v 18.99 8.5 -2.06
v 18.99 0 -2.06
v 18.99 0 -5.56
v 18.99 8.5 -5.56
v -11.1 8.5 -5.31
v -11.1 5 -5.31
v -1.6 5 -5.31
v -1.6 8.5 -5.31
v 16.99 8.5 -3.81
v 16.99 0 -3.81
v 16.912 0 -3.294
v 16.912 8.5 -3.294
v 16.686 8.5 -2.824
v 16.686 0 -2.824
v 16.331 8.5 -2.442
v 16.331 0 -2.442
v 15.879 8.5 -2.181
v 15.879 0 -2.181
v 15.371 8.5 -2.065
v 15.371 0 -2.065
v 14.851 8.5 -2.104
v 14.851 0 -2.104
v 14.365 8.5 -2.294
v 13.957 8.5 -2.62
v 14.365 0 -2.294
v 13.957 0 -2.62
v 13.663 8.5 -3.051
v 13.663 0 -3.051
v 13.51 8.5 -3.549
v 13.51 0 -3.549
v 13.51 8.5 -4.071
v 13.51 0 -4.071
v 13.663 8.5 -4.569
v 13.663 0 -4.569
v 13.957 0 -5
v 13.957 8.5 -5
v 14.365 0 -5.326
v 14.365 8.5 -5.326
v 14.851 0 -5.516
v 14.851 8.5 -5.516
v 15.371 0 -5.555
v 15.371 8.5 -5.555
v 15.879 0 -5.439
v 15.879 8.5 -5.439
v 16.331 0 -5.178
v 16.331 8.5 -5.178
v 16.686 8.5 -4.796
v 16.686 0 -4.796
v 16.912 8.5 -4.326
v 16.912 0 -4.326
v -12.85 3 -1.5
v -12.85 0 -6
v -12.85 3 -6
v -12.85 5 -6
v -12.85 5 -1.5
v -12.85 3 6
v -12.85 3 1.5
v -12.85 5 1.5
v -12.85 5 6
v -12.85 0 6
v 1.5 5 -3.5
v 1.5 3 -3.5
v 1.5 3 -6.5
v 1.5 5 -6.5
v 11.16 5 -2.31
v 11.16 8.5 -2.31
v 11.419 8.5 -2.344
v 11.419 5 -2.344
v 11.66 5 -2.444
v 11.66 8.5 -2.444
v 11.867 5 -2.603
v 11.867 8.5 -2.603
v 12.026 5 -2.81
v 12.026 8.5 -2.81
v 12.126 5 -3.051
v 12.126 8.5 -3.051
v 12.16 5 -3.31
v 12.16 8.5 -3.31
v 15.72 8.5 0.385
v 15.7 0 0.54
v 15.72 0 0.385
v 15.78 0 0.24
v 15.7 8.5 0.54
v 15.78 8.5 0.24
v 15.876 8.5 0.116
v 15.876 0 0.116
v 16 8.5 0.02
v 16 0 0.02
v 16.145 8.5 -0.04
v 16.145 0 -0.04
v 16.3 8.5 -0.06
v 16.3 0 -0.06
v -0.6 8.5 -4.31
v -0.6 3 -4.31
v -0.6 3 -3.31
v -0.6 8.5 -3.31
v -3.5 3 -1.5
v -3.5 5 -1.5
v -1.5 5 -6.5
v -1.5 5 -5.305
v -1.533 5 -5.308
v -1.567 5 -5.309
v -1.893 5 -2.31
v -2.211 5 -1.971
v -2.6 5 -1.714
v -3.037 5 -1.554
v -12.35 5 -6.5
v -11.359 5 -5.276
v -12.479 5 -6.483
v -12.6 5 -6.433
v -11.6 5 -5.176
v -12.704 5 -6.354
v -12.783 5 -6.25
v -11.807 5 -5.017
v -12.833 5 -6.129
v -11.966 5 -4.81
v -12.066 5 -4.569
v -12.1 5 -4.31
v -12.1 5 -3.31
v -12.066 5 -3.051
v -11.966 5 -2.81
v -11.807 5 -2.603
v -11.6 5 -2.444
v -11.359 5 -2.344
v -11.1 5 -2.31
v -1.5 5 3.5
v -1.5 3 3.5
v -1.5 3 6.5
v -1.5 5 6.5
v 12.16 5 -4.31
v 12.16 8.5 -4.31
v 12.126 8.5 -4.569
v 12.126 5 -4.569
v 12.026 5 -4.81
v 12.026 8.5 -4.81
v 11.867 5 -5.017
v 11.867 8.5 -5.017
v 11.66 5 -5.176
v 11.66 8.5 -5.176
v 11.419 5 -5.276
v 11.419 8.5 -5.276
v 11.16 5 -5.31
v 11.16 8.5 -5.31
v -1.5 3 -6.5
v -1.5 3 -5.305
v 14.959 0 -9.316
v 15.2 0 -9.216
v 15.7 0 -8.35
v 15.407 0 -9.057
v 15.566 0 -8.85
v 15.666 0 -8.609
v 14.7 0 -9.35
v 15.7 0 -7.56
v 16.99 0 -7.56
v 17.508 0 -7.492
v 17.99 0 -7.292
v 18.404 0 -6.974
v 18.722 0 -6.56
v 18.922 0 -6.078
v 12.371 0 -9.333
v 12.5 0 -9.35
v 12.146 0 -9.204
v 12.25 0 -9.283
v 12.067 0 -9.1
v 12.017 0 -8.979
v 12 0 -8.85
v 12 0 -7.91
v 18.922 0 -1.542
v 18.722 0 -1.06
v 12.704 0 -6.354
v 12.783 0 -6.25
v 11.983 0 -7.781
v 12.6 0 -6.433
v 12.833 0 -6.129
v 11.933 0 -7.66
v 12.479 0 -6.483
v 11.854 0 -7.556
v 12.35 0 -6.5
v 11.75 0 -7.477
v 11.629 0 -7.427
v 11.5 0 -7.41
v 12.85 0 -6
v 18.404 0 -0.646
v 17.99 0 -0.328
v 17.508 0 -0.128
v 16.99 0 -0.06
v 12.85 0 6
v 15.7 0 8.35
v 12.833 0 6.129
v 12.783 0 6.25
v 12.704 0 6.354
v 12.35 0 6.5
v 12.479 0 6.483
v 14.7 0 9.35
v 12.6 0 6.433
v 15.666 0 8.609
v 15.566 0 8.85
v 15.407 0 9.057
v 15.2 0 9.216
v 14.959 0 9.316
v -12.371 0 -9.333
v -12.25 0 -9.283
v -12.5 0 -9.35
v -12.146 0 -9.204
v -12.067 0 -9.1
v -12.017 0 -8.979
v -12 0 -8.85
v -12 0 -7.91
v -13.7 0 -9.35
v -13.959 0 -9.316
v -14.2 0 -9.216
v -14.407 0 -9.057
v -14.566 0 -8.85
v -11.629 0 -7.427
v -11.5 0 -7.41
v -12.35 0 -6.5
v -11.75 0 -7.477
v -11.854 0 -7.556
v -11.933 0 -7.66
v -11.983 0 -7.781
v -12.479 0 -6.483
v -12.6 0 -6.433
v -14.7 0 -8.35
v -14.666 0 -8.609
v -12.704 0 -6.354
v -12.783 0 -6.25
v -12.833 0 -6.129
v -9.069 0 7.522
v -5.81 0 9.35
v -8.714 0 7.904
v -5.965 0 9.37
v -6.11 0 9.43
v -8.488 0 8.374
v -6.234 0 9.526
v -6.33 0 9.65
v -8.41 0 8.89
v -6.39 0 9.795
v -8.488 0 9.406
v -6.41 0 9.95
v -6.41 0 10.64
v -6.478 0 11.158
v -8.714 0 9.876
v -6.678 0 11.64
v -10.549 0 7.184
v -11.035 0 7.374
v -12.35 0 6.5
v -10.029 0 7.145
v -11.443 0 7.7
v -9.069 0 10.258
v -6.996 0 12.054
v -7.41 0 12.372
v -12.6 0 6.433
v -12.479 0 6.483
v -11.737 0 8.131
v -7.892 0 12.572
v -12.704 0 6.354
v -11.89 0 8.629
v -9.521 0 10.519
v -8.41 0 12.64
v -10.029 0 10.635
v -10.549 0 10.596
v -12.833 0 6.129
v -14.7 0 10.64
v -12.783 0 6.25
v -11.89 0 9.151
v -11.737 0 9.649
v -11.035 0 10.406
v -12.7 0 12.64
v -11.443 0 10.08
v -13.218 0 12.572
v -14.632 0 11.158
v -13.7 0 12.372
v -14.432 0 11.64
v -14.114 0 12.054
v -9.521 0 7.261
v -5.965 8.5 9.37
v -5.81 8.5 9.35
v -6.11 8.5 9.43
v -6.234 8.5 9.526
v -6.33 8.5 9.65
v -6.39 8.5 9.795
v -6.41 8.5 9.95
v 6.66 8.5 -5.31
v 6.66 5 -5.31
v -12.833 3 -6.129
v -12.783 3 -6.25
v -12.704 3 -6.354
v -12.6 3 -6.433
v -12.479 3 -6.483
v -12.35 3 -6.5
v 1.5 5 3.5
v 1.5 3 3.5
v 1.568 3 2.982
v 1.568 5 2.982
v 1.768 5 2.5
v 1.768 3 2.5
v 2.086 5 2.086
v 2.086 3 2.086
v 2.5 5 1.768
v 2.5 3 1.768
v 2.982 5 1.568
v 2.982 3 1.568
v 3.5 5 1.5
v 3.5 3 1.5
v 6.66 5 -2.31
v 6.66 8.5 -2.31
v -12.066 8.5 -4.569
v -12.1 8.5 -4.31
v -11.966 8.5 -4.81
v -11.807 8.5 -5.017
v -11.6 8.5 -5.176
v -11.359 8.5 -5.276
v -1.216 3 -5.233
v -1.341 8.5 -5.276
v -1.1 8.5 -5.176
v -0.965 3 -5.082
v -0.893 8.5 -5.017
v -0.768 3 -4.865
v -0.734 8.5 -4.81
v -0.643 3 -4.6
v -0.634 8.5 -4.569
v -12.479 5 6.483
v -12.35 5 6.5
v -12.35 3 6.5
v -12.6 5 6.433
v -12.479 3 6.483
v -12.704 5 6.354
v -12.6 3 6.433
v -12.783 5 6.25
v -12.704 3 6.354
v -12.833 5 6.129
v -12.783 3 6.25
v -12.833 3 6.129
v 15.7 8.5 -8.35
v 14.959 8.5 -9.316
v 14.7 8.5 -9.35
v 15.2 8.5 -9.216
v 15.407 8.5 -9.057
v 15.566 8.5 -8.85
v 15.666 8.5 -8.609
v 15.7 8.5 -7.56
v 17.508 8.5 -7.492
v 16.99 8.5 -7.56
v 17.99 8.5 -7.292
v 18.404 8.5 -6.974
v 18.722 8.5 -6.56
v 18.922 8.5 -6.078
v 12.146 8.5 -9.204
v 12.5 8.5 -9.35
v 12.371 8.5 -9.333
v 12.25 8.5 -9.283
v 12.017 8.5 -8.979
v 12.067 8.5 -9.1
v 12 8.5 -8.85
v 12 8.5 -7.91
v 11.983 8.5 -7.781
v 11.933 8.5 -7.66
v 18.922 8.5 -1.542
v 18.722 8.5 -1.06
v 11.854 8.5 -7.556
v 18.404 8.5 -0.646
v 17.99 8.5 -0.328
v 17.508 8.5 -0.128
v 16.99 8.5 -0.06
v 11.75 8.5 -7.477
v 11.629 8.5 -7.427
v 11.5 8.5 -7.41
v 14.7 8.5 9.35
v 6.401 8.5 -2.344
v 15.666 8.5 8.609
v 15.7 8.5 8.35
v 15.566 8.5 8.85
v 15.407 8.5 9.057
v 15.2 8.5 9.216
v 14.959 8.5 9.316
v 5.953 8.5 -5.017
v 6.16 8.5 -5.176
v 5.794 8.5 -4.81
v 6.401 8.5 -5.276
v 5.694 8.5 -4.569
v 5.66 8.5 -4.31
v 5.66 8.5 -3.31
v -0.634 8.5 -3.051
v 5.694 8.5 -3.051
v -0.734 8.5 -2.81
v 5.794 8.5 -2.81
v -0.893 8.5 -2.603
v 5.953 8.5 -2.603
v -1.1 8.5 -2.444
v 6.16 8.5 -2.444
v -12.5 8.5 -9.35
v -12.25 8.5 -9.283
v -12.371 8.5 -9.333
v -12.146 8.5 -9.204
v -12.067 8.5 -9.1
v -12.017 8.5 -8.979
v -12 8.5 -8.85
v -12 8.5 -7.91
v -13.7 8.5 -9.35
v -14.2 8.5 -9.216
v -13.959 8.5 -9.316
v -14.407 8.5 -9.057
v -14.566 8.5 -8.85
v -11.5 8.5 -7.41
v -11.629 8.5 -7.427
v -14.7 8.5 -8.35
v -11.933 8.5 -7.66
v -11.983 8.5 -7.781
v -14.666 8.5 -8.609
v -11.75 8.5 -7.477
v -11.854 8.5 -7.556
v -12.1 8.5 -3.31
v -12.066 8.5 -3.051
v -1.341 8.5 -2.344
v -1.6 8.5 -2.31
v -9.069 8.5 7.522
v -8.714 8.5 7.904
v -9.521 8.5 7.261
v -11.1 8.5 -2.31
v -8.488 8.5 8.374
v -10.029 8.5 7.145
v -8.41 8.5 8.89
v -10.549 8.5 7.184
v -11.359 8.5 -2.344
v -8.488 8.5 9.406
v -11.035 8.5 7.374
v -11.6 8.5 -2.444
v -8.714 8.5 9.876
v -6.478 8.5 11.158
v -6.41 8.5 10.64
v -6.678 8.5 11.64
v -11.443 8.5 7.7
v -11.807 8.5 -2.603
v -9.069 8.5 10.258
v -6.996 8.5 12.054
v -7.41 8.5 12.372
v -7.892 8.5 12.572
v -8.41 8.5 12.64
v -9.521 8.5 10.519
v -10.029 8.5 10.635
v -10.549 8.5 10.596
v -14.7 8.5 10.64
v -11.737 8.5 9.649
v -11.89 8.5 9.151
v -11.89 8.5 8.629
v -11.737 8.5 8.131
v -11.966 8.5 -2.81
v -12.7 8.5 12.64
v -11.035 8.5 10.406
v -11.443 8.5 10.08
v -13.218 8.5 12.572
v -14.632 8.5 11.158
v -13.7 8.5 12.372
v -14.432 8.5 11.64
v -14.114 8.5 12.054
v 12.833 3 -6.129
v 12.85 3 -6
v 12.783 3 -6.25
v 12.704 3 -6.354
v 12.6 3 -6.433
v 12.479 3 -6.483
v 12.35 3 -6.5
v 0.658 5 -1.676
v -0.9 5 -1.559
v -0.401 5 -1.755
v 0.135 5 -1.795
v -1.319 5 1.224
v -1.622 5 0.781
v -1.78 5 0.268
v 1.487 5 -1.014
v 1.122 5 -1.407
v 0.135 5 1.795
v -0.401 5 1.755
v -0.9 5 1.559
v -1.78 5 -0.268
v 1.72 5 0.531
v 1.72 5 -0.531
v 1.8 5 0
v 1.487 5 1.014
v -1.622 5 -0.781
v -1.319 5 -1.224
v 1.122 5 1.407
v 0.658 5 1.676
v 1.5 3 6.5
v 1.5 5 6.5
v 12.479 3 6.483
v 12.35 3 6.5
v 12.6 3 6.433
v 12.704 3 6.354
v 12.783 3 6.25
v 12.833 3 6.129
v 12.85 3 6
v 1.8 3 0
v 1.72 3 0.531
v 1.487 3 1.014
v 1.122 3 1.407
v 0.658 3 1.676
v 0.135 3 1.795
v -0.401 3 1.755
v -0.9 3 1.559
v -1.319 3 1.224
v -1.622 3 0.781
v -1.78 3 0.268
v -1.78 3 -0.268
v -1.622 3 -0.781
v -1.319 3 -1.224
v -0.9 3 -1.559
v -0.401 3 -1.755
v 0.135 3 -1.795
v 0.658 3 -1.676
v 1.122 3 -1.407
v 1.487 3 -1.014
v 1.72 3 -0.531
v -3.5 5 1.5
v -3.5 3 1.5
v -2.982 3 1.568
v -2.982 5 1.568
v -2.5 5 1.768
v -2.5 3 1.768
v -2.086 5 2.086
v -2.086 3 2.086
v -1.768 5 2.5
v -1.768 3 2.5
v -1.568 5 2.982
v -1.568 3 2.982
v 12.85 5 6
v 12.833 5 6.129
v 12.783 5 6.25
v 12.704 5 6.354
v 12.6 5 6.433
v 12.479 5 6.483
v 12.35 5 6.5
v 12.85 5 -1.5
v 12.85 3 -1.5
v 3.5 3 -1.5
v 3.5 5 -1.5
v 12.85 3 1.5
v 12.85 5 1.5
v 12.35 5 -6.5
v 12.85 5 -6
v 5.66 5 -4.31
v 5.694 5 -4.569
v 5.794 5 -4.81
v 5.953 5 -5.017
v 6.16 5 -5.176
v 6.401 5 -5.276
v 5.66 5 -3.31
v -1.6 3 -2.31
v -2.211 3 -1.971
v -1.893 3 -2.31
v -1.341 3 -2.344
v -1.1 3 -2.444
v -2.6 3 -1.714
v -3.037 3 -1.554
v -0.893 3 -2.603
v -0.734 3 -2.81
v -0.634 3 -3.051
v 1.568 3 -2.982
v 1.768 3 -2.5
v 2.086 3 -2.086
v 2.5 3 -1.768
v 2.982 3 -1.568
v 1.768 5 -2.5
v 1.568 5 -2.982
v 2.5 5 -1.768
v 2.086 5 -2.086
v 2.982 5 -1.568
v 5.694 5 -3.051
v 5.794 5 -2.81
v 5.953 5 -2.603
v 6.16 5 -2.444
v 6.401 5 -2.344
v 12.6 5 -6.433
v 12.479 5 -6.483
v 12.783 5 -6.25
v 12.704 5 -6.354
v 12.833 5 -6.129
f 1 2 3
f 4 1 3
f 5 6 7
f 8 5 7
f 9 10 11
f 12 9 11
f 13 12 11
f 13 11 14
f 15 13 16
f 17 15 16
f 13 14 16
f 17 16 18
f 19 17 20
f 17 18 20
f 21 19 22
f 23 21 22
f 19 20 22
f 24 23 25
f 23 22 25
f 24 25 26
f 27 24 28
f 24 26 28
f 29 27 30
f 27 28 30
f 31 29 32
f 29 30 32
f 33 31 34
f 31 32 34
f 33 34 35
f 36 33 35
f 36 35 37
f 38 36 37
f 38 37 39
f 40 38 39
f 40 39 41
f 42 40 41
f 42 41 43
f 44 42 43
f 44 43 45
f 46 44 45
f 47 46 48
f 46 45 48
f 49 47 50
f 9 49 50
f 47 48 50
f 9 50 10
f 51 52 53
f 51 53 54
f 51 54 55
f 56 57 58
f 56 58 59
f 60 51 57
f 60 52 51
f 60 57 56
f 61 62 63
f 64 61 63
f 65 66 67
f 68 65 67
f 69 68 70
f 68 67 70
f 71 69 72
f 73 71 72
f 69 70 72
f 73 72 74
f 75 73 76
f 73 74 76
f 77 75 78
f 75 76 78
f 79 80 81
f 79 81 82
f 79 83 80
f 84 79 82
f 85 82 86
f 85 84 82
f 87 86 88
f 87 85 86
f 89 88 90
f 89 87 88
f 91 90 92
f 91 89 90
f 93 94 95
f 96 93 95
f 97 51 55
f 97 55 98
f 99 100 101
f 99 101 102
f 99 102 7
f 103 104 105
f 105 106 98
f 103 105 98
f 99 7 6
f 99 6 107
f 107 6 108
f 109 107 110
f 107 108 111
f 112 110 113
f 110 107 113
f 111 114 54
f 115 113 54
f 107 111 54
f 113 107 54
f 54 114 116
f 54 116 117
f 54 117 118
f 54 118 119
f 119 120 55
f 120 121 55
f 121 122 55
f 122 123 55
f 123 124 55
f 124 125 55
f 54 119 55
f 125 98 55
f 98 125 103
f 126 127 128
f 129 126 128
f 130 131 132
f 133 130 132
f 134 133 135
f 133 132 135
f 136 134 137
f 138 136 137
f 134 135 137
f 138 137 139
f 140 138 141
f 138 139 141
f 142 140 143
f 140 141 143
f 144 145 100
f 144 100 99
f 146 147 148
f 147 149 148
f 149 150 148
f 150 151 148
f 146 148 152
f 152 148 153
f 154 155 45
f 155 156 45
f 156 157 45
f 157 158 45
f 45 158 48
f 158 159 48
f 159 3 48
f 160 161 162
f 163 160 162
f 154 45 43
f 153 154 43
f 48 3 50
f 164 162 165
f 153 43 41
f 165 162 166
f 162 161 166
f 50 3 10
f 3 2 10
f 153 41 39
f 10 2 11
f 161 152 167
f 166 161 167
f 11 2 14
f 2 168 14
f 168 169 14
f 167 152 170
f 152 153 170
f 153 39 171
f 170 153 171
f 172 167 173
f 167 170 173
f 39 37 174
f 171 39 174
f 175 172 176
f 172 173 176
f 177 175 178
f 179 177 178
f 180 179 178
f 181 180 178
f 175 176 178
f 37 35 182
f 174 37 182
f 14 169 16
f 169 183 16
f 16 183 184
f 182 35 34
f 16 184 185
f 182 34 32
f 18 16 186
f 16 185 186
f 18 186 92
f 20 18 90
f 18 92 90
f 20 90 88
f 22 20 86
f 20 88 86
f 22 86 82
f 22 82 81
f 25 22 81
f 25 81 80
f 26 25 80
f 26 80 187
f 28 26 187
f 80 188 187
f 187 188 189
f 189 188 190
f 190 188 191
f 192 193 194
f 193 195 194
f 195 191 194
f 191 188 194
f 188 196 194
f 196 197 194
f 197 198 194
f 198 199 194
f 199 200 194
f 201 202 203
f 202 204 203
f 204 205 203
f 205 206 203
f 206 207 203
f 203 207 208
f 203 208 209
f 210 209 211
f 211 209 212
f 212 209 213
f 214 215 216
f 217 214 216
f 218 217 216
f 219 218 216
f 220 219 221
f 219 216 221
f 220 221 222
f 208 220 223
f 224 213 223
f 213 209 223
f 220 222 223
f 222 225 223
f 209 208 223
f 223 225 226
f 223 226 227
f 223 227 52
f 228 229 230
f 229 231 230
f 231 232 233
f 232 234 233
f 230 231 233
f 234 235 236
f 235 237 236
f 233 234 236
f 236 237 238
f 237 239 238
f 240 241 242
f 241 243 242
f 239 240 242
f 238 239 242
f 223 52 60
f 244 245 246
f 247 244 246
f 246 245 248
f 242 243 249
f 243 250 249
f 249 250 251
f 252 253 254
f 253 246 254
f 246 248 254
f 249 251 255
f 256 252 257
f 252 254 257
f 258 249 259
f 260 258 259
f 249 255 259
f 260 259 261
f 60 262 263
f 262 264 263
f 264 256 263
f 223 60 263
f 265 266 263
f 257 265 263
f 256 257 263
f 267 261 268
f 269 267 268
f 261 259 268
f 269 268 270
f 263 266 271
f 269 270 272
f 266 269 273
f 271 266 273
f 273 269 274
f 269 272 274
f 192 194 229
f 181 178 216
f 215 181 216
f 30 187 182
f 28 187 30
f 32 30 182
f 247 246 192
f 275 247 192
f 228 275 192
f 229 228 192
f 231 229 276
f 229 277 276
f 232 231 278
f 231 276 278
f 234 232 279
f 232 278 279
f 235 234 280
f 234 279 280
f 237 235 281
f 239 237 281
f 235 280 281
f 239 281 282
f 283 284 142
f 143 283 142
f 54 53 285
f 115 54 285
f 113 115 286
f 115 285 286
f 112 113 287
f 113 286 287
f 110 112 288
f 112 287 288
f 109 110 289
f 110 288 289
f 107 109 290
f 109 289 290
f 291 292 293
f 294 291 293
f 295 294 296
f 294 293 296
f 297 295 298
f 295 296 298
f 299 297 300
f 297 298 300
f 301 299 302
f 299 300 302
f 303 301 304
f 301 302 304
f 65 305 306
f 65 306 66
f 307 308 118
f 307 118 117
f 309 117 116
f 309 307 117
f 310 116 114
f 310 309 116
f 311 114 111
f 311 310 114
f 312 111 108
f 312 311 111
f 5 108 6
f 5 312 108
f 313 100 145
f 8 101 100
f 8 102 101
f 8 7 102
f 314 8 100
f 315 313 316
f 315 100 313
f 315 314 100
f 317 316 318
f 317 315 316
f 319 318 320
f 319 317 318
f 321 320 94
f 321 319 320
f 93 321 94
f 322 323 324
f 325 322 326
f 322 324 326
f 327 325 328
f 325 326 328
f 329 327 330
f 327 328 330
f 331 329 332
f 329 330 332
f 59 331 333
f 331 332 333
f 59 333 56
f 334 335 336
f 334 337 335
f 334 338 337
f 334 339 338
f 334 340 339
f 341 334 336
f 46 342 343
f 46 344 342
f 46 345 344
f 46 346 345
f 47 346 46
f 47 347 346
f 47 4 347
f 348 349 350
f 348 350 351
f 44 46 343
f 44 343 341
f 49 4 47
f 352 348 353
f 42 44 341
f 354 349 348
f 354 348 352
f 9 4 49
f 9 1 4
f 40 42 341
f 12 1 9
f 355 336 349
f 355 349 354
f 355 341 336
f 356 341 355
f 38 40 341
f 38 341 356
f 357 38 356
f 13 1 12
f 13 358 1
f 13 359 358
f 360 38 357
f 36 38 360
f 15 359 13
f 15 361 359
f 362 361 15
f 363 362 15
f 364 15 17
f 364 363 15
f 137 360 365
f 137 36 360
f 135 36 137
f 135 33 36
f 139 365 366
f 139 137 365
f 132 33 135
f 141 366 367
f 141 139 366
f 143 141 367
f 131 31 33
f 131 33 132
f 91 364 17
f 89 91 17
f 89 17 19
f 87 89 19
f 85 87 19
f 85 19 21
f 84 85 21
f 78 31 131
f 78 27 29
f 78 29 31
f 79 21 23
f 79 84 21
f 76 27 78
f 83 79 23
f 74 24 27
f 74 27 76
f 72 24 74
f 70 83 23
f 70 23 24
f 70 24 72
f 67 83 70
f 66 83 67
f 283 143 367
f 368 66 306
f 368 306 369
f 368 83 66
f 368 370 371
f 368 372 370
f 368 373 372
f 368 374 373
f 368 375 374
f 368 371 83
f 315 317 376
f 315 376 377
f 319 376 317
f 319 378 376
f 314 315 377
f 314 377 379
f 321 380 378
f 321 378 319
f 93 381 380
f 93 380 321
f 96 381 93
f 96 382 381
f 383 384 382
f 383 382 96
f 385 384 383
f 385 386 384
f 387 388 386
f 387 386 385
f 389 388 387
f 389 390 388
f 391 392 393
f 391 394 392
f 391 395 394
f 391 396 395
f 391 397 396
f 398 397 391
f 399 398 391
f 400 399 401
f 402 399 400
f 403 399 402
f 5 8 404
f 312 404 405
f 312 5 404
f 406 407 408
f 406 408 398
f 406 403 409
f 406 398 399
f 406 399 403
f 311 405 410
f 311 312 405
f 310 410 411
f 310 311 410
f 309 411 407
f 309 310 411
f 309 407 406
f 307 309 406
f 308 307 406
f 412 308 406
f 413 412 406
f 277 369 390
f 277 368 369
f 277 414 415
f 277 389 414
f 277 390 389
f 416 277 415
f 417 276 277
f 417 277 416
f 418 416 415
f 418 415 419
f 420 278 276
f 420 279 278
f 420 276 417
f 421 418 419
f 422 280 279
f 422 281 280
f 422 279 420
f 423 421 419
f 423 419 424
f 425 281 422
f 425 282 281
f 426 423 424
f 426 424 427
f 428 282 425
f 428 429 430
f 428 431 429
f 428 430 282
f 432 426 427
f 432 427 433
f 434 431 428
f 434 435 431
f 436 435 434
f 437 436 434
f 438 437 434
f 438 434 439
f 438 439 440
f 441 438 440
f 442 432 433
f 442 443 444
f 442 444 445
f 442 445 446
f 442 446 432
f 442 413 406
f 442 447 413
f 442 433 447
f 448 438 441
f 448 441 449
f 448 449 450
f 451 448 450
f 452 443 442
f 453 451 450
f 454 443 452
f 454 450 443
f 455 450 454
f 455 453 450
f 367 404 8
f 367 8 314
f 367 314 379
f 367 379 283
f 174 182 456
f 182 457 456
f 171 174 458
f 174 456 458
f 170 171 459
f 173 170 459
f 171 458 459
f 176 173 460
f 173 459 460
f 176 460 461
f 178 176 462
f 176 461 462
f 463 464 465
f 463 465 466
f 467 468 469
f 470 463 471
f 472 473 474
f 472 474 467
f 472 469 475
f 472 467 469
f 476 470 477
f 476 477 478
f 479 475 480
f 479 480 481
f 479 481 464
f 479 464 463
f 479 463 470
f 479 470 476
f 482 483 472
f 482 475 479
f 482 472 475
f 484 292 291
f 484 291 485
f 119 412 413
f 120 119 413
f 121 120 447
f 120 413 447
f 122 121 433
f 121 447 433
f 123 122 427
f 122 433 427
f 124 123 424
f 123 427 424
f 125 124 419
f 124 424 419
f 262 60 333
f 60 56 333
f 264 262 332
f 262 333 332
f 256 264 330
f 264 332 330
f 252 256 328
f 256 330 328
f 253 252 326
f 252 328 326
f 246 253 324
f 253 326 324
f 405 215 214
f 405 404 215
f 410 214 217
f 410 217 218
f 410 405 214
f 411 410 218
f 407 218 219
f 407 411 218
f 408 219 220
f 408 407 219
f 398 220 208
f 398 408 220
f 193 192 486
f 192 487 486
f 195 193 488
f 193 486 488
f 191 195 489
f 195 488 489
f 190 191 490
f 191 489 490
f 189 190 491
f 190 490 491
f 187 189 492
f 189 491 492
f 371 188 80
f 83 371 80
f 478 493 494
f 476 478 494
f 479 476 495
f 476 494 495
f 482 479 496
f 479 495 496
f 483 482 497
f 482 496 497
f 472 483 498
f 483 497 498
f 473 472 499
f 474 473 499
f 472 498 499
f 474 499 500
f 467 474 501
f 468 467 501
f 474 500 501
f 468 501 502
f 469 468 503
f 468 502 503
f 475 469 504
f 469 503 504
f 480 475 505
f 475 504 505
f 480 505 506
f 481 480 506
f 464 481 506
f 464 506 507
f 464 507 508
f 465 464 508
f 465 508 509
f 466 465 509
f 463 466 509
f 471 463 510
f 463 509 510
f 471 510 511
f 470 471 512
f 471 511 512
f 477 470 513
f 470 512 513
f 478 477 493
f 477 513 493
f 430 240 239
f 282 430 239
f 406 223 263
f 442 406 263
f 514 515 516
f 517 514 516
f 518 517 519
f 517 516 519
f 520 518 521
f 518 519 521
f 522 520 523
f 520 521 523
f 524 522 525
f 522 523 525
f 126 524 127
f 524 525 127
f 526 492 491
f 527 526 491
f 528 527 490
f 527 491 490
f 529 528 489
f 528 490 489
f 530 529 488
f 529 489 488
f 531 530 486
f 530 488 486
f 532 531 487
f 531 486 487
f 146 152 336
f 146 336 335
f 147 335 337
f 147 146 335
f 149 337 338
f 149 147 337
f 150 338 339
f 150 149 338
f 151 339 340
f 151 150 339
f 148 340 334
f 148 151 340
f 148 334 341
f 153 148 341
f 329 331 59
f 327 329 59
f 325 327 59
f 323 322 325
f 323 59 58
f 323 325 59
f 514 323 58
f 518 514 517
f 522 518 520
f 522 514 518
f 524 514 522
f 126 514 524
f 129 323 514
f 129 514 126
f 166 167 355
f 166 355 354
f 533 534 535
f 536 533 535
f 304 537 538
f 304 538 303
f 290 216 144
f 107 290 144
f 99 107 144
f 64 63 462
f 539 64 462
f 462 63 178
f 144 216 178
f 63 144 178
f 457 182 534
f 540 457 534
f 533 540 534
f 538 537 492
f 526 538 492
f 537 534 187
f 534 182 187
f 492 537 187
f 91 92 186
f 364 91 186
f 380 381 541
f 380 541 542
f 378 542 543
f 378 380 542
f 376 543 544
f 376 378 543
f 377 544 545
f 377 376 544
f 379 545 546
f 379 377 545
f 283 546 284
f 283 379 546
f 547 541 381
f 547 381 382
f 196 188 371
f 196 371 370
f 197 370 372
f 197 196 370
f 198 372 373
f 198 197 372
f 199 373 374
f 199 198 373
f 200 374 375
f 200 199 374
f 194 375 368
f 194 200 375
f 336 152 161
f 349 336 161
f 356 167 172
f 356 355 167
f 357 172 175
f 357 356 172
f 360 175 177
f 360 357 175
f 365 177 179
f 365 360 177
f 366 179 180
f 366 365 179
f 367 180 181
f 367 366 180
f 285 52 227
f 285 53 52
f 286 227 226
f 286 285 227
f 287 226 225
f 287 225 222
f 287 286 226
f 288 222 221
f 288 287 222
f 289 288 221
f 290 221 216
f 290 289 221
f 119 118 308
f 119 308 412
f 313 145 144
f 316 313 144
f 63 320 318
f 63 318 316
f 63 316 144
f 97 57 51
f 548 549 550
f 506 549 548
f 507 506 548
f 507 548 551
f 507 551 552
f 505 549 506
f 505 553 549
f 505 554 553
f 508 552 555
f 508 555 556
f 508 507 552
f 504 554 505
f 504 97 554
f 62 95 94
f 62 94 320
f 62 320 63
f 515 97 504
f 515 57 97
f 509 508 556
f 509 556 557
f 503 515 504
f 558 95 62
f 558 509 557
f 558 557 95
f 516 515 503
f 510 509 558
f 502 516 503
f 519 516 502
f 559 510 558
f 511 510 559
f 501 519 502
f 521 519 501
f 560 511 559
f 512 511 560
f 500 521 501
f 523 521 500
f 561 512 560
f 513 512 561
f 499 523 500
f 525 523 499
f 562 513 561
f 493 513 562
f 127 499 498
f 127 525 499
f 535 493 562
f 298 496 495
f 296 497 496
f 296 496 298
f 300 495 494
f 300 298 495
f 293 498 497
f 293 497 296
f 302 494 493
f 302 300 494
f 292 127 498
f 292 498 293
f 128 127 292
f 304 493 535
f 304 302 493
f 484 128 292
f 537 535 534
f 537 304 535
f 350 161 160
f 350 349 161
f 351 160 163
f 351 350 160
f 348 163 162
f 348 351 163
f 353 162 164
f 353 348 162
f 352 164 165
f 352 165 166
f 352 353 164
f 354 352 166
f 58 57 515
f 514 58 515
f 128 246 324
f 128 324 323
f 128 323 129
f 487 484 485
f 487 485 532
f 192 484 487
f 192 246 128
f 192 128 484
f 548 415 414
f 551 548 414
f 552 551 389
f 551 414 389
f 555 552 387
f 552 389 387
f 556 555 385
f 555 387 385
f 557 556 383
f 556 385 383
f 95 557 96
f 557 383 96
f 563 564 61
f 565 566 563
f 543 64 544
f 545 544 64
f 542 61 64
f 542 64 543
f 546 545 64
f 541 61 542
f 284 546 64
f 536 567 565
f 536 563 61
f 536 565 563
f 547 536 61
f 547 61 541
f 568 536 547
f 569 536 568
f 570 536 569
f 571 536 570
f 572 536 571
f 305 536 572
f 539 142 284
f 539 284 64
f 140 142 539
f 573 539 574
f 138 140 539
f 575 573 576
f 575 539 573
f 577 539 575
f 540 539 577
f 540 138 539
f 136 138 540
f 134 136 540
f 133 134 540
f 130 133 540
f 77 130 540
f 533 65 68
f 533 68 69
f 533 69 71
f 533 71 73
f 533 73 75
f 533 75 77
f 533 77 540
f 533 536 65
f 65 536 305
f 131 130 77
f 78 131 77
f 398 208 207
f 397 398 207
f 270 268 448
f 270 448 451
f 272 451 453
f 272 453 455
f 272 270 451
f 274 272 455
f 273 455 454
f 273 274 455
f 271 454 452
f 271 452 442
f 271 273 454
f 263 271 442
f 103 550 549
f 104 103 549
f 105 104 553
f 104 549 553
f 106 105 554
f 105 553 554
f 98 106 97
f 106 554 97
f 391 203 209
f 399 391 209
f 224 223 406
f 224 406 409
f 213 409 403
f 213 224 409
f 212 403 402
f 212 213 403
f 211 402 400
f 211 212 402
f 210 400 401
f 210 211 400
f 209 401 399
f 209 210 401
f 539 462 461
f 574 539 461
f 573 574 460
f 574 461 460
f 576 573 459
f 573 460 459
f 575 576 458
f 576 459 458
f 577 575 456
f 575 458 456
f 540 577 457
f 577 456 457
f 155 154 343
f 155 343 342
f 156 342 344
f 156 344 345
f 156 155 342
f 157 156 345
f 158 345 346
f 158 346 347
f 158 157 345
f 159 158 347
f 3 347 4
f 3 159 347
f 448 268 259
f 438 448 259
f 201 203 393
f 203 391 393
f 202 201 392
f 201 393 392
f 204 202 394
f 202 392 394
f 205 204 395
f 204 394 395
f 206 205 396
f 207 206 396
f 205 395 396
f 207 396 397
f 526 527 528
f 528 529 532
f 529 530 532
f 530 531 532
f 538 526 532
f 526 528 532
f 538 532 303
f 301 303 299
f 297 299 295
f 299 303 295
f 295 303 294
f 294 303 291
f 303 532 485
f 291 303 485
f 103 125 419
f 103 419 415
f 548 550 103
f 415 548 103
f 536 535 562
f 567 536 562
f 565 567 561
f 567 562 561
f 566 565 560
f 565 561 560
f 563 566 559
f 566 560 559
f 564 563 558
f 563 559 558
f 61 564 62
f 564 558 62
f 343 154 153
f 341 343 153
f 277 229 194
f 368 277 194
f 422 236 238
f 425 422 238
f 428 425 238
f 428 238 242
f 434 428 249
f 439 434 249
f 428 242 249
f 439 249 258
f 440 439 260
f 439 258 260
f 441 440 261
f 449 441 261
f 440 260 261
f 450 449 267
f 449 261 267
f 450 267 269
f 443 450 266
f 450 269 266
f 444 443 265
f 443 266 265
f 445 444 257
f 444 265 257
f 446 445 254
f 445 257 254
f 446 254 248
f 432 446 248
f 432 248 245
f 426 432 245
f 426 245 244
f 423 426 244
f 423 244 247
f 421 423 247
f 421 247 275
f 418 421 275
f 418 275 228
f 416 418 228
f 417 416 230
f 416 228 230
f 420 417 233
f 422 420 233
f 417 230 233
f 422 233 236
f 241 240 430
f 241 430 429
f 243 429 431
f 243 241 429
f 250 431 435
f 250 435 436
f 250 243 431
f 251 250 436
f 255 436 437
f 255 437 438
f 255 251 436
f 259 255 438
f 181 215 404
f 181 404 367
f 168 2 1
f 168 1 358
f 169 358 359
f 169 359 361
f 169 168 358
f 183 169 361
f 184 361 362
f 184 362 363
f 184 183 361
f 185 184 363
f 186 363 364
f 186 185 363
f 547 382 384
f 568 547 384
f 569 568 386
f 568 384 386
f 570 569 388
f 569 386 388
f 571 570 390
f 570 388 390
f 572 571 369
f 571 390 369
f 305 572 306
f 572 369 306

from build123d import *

# Parameters (mm, degrees)
SKETCH004_R     = 1.75
SKETCH004_W     = 11.5
SKETCH004_H     = 3
SKETCH004_W_2   = 6.5
PAD_DEPTH       = 8.5
FILLET_R        = 1
FILLET001_R     = 0.6
FILLET002_R     = 0.5
SKETCH_W        = 25.7
SKETCH_H        = 13
POCKET_DEPTH    = 3
FILLET003_R     = 0.5
SKETCH005_R     = 1.8
POCKET001_DEPTH = 2


with BuildPart() as part:
    # Sketch004 → Pad (new body)
    with BuildSketch(Plane.XZ):
        with BuildLine():
            Line((15.7, 8.35), (15.7, -0.06))
            Line((15.7, -0.06), (16.99, -0.06))
            ThreePointArc((18.99, -2.06), (18.404214, -0.645786), (16.99, -0.06))
            Line((18.99, -2.06), (18.99, -5.56))
            ThreePointArc((16.99, -7.56), (18.404214, -6.974214), (18.99, -5.56))
            Line((16.99, -7.56), (15.7, -7.56))
            Line((15.7, -8.35), (15.7, -7.56))
            ThreePointArc((14.7, -9.35), (15.407107, -9.057107), (15.7, -8.35))
            Line((14.7, -9.35), (12, -9.35))
            Line((12, -7.41), (12, -9.35))
            Line((-12, -7.41), (12, -7.41))
            Line((-12, -7.41), (-12, -9.35))
            Line((-12, -9.35), (-13.7, -9.35))
            ThreePointArc((-14.7, -8.35), (-14.407107, -9.057107), (-13.7, -9.35))
            Line((-14.7, -8.35), (-14.7, 10.64))
            ThreePointArc((-12.7, 12.64), (-14.114214, 12.054214), (-14.7, 10.64))
            Line((-12.7, 12.64), (-8.41, 12.64))
            ThreePointArc((-6.41, 10.64), (-6.995786, 12.054214), (-8.41, 12.64))
            Line((-6.41, 10.64), (-6.41, 9.35))
            Line((-6.41, 9.35), (14.7, 9.35))
            ThreePointArc((15.7, 8.35), (15.407107, 9.057107), (14.7, 9.35))
        make_face()
        with Locations((-10.16, 8.89)):
            Circle(SKETCH004_R, mode=Mode.SUBTRACT)
        with Locations((15.24, -3.81)):
            Circle(SKETCH004_R, mode=Mode.SUBTRACT)
        with Locations((-6.35, -3.81)):
            Rectangle(SKETCH004_W, SKETCH004_H, mode=Mode.SUBTRACT)
        with Locations((8.91, -3.81)):
            Rectangle(SKETCH004_W_2, SKETCH004_H, mode=Mode.SUBTRACT)
    extrude(amount=-PAD_DEPTH)

    # Fillet
    fillet_edges = [part.edges().sort_by_distance(p)[0] for p in [
        (12.16, 4.25, -5.31),
        (5.66, 4.25, -2.31),
        (12.16, 4.25, -2.31),
        (5.66, 4.25, -5.31),
        (-0.6, 4.25, -2.31),
        (-12.1, 4.25, -2.31),
        (-0.6, 4.25, -5.31),
        (-12.1, 4.25, -5.31),
    ]]
    fillet(fillet_edges, radius=FILLET_R)

    # Fillet001
    fillet001_edges = [part.edges().sort_by_distance(p)[0] for p in [
        (-6.41, 4.25, 9.35),
        (15.7, 4.25, -0.06),
    ]]
    fillet(fillet001_edges, radius=FILLET001_R)

    # Fillet002
    fillet002_edges = [part.edges().sort_by_distance(p)[0] for p in [
        (12, 4.25, -9.35),
        (-12, 4.25, -9.35),
        (-12, 4.25, -7.41),
        (12, 4.25, -7.41),
    ]]
    fillet(fillet002_edges, radius=FILLET002_R)

    # Sketch (on Face1 of Fillet002) → Pocket (cut)
    with BuildSketch(Plane.XZ):
        Rectangle(SKETCH_W, SKETCH_H)
    extrude(amount=-POCKET_DEPTH, mode=Mode.SUBTRACT)

    # Fillet003
    fillet003_edges = [part.edges().sort_by_distance(p)[0] for p in [
        (-12.85, 1.5, 6.5),
        (12.85, 1.5, 6.5),
        (-12.85, 1.5, -6.5),
        (12.85, 1.5, -6.5),
    ]]
    fillet(fillet003_edges, radius=FILLET003_R)

    # Sketch005 (on Face39 of Fillet003) → Pocket001 (cut)
    with BuildSketch(Plane.XZ.offset(-3)):
        Circle(SKETCH005_R)
        with BuildLine():
            Line((-12.85, 1.5), (-3.5, 1.5))
            ThreePointArc((-3.5, 1.5), (-2.085786, 2.085786), (-1.5, 3.5))
            Line((-1.5, 3.5), (-1.5, 6.5))
            Line((-1.5, 6.5), (-12.35, 6.5))
            ThreePointArc((-12.35, 6.5), (-12.703553, 6.353553), (-12.85, 6))
            Line((-12.85, 6), (-12.85, 1.5))
        make_face()
        with BuildLine():
            Line((1.5, 6.5), (12.35, 6.5))
            ThreePointArc((12.85, 6), (12.703553, 6.353553), (12.35, 6.5))
            Line((12.85, 6), (12.85, 1.5))
            Line((12.85, 1.5), (3.5, 1.5))
            ThreePointArc((1.5, 3.5), (2.085786, 2.085786), (3.5, 1.5))
            Line((1.5, 3.5), (1.5, 6.5))
        make_face()
        with BuildLine():
            Line((12.85, -1.5), (3.5, -1.5))
            ThreePointArc((3.5, -1.5), (2.085786, -2.085786), (1.5, -3.5))
            Line((1.5, -3.5), (1.5, -6.5))
            Line((1.5, -6.5), (12.35, -6.5))
            ThreePointArc((12.35, -6.5), (12.703553, -6.353553), (12.85, -6))
            Line((12.85, -6), (12.85, -1.5))
        make_face()
        with BuildLine():
            Line((-12.85, -1.5), (-3.5, -1.5))
            ThreePointArc((-1.5, -3.5), (-2.085786, -2.085786), (-3.5, -1.5))
            Line((-1.5, -3.5), (-1.5, -6.5))
            Line((-1.5, -6.5), (-12.35, -6.5))
            ThreePointArc((-12.85, -6), (-12.703553, -6.353553), (-12.35, -6.5))
            Line((-12.85, -6), (-12.85, -1.5))
        make_face()
    extrude(amount=-POCKET001_DEPTH, mode=Mode.SUBTRACT)


solid = part.part
